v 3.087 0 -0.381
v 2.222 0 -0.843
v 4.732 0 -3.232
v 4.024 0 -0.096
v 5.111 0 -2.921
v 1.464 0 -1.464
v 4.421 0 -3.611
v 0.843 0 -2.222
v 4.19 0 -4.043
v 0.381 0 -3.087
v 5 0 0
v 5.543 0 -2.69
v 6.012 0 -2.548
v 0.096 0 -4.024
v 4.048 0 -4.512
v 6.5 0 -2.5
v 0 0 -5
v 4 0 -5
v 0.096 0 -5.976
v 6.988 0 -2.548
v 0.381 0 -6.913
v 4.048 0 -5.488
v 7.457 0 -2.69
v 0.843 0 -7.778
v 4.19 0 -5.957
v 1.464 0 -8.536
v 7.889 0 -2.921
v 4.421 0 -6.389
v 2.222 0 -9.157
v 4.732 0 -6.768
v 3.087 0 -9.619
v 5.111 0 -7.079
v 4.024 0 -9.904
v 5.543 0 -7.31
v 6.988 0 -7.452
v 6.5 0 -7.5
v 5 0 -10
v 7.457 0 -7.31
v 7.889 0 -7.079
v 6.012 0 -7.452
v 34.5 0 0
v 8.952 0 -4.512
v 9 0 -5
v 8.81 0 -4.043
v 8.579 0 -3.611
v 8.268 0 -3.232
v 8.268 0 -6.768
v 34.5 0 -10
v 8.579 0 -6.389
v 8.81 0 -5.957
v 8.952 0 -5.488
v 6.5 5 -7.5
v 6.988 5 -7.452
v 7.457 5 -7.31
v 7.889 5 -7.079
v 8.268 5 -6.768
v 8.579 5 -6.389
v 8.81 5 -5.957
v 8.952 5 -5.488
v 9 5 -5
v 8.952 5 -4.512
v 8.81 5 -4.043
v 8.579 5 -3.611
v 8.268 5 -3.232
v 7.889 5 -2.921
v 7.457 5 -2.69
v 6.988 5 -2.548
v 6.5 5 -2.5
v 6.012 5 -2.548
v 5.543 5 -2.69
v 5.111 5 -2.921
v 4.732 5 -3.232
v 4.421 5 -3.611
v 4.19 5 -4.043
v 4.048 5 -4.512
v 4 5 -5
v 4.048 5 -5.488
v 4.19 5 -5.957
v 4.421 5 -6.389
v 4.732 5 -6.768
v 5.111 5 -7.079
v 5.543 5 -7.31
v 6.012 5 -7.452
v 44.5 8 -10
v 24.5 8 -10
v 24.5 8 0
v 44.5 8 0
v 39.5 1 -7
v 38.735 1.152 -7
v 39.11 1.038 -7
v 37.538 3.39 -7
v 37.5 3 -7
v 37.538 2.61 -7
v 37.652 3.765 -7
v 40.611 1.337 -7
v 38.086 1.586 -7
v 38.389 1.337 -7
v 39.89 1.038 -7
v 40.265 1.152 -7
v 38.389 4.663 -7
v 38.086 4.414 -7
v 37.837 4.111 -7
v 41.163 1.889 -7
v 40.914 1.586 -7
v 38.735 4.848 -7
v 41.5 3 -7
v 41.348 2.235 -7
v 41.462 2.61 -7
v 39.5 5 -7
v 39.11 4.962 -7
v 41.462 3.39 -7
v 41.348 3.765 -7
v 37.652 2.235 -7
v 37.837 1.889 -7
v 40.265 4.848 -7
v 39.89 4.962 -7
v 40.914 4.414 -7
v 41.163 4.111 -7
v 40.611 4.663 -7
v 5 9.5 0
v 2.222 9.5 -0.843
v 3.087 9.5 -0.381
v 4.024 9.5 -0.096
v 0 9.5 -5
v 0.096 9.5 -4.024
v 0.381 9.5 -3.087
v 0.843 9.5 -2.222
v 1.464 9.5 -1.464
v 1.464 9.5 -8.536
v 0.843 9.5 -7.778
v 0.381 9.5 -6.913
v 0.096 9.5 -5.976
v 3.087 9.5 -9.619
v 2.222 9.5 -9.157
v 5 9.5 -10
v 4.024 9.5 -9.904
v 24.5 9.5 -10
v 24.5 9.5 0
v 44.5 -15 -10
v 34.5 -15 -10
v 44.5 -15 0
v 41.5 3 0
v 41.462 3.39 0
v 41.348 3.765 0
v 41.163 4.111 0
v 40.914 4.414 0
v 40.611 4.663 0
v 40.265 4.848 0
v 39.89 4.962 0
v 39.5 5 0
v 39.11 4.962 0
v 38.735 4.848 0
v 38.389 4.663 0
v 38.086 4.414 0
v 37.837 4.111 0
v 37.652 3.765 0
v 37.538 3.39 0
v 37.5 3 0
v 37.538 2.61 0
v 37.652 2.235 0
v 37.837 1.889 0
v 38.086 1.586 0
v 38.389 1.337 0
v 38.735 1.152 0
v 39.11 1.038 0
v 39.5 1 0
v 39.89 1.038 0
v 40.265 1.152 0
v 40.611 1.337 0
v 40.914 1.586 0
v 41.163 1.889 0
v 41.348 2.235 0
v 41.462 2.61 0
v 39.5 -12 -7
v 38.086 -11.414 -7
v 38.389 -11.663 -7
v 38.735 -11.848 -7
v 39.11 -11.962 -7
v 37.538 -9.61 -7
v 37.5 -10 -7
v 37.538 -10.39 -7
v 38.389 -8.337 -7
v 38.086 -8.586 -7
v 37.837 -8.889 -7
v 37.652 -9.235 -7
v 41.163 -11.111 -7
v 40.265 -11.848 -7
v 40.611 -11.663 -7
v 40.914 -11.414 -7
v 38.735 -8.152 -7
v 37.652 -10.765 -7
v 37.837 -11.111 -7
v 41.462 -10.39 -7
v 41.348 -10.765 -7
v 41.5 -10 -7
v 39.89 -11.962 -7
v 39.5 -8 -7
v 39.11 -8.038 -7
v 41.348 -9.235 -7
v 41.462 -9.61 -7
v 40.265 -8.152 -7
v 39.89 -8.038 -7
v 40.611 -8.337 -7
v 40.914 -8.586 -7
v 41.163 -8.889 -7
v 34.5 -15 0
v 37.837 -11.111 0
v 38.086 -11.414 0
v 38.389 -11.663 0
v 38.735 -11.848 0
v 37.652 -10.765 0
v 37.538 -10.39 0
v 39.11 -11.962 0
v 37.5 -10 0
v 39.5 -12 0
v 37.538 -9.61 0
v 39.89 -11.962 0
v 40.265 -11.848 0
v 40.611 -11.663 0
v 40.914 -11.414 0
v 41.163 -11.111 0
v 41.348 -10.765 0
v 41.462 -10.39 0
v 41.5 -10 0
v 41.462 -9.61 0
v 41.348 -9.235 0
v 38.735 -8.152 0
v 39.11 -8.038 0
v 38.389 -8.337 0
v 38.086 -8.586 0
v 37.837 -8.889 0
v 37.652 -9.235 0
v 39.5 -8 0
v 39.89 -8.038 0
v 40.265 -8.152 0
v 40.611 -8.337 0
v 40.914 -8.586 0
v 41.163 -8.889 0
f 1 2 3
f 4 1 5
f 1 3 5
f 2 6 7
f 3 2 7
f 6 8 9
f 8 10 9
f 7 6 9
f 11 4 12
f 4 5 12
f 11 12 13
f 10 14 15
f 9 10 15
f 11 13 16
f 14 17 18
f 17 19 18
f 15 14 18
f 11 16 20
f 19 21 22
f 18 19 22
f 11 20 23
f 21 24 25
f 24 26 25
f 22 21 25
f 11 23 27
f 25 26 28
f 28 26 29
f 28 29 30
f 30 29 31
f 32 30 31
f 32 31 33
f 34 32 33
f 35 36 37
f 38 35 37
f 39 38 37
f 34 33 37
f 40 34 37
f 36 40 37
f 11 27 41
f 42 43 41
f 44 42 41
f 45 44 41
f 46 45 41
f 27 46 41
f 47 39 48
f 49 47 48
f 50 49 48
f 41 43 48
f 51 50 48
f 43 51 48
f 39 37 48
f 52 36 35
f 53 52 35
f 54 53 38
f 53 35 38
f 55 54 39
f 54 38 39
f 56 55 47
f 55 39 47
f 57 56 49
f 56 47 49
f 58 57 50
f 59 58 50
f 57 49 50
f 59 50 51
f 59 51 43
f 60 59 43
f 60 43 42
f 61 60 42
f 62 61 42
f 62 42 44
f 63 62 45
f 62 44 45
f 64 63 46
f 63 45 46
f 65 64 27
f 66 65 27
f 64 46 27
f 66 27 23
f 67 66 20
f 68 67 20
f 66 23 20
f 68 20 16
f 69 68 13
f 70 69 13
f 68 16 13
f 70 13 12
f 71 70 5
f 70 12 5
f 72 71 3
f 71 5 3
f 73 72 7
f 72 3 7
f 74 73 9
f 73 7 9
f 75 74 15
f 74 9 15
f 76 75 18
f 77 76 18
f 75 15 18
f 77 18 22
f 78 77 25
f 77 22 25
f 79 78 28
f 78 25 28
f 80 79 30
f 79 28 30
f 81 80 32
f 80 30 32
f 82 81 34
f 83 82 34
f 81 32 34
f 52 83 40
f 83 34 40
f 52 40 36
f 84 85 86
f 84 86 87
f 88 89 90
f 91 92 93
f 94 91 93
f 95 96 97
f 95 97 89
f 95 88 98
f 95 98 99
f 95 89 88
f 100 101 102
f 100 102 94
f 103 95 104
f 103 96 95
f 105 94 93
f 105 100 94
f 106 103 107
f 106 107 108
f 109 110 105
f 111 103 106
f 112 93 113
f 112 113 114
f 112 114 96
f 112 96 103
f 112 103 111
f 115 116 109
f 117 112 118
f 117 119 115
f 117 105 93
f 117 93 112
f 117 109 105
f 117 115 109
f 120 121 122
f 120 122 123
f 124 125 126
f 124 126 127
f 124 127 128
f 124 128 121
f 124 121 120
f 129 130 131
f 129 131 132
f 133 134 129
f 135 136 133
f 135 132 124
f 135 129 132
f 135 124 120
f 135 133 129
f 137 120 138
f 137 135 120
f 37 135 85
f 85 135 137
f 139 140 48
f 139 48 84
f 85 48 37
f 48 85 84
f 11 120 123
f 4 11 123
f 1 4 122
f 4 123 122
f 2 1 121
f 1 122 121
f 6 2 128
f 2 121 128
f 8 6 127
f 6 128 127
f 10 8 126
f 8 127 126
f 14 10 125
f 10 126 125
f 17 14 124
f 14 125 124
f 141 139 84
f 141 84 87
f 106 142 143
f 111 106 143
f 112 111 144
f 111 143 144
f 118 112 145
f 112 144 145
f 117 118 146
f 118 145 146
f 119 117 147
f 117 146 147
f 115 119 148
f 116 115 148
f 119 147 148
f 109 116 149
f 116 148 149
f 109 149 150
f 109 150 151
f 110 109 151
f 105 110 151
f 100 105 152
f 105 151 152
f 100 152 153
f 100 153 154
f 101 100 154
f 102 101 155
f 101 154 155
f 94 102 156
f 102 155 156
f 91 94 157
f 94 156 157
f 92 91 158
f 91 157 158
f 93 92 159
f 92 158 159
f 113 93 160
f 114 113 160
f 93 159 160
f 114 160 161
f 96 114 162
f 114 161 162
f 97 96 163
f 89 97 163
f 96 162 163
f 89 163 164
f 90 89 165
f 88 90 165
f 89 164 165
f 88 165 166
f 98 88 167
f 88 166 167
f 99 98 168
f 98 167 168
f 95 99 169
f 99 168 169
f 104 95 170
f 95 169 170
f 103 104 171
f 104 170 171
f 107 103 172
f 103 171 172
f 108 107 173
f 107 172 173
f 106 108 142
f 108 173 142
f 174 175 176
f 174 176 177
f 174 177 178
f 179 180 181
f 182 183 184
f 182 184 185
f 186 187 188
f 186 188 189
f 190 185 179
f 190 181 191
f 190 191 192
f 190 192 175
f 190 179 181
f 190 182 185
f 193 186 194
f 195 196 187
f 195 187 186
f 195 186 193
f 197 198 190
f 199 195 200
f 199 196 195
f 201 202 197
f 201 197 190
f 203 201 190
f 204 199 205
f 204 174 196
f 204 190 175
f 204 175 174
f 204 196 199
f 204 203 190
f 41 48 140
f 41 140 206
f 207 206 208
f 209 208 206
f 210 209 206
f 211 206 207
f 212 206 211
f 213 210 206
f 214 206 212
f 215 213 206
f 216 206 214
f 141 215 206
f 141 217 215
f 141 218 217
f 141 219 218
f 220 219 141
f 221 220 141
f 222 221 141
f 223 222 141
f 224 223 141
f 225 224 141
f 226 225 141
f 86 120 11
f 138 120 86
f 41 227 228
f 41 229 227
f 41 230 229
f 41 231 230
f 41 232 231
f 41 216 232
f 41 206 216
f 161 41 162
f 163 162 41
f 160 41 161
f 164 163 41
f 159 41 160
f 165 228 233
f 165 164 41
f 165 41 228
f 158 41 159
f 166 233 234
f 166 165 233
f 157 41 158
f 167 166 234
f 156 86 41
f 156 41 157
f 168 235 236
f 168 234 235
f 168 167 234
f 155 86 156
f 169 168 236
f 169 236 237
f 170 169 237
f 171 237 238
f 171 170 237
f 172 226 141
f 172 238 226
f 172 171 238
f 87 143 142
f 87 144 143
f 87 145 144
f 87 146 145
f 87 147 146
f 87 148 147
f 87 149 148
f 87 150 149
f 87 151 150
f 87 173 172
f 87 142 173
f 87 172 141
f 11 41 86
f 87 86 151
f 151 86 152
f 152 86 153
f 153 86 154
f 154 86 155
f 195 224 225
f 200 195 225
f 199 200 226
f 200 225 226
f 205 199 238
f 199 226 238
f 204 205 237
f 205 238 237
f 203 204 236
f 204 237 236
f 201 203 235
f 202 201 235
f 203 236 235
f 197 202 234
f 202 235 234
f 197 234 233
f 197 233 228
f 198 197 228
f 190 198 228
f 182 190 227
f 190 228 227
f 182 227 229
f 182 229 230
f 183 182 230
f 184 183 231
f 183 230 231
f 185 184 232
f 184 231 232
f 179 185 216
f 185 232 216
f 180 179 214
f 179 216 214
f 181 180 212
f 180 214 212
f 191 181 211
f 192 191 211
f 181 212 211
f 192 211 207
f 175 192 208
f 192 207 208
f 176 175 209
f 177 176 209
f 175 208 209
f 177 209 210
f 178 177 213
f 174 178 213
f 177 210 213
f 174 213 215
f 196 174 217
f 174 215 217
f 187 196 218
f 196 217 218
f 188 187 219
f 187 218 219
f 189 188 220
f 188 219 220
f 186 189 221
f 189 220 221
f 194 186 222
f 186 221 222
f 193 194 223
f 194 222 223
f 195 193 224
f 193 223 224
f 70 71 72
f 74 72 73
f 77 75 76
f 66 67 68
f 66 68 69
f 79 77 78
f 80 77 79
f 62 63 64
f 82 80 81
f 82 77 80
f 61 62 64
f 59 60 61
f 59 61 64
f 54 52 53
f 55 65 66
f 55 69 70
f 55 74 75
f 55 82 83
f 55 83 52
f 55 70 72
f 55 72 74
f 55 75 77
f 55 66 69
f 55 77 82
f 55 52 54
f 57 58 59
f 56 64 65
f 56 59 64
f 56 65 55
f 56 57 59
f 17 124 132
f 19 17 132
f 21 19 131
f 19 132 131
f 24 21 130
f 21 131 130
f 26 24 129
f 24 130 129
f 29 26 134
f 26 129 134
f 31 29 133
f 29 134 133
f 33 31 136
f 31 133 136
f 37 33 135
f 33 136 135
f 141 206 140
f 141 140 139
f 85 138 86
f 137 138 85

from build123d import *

# Parameters (mm, degrees)
BOSS_EXTRUDE1_DEPTH    = 10
SKETCH2_W              = 20
SKETCH2_H              = 17.246462599
CUT_EXTRUDE1_DEPTH     = 2
FILLET1_R              = 5
SKETCH4_R              = 2.5
CUT_EXTRUDE4_DEPTH     = 5
SKETCH6_W              = 10
SKETCH6_H              = 10
BOSS_EXTRUDE2_DEPTH    = 15
SKETCH5_R              = 2
CUT_EXTRUDE5_DEPTH     = 7
CUT_EXTRUDE6_START     = -0.5
CUT_EXTRUDE6_OUTLINE_W = 25.5
CUT_EXTRUDE6_OUTLINE_H = 12
CUT_EXTRUDE6_DEPTH     = 0.5


# Read off the part's stored shape, not the designer's step: Cut-Extrude6
with BuildPart() as part:
    # Sketch1 → Boss-Extrude1 (new body)
    with BuildSketch(Plane(origin=(0, 0, 0), x_dir=(1, 0, 0), z_dir=(0, 1, 0))):
        Polygon((0, 0), (34.5, 0), (44.5, 0), (44.5, 10), (0, 10), align=None)
    extrude(amount=BOSS_EXTRUDE1_DEPTH)

    # Sketch2 → Cut-Extrude1 (cut)
    with BuildSketch(Plane(origin=(0, 10, 0), x_dir=(1, 0, 0), z_dir=(0, 1, 0))):
        with Locations((34.5, 1.3767687)):
            Rectangle(SKETCH2_W, SKETCH2_H)
    extrude(amount=-CUT_EXTRUDE1_DEPTH, mode=Mode.SUBTRACT)

    # Fillet1
    fillet1_edges = [part.edges().sort_by_distance(p)[0] for p in [
        (0, 5, -10),
        (0, 5, 0),
    ]]
    fillet(fillet1_edges, radius=FILLET1_R - 0.0001)  # a hair under: the kernel refuses the full size

    # Sketch4 → Cut-Extrude4 (cut)
    with BuildSketch(Plane.XZ):
        with Locations(Location((6.5, -5, 0), (0, 0, 270))):
            Circle(SKETCH4_R)
    extrude(amount=-CUT_EXTRUDE4_DEPTH, mode=Mode.SUBTRACT)

    # Sketch6 → Boss-Extrude2 (add)
    with BuildSketch(Plane.XZ):
        with Locations((39.5, -5)):
            Rectangle(SKETCH6_W, SKETCH6_H)
    extrude(amount=BOSS_EXTRUDE2_DEPTH)

    # Sketch5 → Cut-Extrude5 (cut)
    with BuildSketch(Plane.XY):
        with Locations((39.5, 3)):
            Circle(SKETCH5_R)
        with Locations((39.5, -10)):
            Circle(SKETCH5_R)
    extrude(amount=-CUT_EXTRUDE5_DEPTH, mode=Mode.SUBTRACT)

    # Cut-Extrude6 outline → Cut-Extrude6 (cut)
    with BuildSketch(Plane(origin=(0, 10, 0), x_dir=(1, 0, 0), z_dir=(0, 1, 0)).offset(CUT_EXTRUDE6_START)):
        with Locations((11.75, 5)):
            Rectangle(CUT_EXTRUDE6_OUTLINE_W, CUT_EXTRUDE6_OUTLINE_H)
    extrude(amount=CUT_EXTRUDE6_DEPTH, mode=Mode.SUBTRACT)


solid = part.part
